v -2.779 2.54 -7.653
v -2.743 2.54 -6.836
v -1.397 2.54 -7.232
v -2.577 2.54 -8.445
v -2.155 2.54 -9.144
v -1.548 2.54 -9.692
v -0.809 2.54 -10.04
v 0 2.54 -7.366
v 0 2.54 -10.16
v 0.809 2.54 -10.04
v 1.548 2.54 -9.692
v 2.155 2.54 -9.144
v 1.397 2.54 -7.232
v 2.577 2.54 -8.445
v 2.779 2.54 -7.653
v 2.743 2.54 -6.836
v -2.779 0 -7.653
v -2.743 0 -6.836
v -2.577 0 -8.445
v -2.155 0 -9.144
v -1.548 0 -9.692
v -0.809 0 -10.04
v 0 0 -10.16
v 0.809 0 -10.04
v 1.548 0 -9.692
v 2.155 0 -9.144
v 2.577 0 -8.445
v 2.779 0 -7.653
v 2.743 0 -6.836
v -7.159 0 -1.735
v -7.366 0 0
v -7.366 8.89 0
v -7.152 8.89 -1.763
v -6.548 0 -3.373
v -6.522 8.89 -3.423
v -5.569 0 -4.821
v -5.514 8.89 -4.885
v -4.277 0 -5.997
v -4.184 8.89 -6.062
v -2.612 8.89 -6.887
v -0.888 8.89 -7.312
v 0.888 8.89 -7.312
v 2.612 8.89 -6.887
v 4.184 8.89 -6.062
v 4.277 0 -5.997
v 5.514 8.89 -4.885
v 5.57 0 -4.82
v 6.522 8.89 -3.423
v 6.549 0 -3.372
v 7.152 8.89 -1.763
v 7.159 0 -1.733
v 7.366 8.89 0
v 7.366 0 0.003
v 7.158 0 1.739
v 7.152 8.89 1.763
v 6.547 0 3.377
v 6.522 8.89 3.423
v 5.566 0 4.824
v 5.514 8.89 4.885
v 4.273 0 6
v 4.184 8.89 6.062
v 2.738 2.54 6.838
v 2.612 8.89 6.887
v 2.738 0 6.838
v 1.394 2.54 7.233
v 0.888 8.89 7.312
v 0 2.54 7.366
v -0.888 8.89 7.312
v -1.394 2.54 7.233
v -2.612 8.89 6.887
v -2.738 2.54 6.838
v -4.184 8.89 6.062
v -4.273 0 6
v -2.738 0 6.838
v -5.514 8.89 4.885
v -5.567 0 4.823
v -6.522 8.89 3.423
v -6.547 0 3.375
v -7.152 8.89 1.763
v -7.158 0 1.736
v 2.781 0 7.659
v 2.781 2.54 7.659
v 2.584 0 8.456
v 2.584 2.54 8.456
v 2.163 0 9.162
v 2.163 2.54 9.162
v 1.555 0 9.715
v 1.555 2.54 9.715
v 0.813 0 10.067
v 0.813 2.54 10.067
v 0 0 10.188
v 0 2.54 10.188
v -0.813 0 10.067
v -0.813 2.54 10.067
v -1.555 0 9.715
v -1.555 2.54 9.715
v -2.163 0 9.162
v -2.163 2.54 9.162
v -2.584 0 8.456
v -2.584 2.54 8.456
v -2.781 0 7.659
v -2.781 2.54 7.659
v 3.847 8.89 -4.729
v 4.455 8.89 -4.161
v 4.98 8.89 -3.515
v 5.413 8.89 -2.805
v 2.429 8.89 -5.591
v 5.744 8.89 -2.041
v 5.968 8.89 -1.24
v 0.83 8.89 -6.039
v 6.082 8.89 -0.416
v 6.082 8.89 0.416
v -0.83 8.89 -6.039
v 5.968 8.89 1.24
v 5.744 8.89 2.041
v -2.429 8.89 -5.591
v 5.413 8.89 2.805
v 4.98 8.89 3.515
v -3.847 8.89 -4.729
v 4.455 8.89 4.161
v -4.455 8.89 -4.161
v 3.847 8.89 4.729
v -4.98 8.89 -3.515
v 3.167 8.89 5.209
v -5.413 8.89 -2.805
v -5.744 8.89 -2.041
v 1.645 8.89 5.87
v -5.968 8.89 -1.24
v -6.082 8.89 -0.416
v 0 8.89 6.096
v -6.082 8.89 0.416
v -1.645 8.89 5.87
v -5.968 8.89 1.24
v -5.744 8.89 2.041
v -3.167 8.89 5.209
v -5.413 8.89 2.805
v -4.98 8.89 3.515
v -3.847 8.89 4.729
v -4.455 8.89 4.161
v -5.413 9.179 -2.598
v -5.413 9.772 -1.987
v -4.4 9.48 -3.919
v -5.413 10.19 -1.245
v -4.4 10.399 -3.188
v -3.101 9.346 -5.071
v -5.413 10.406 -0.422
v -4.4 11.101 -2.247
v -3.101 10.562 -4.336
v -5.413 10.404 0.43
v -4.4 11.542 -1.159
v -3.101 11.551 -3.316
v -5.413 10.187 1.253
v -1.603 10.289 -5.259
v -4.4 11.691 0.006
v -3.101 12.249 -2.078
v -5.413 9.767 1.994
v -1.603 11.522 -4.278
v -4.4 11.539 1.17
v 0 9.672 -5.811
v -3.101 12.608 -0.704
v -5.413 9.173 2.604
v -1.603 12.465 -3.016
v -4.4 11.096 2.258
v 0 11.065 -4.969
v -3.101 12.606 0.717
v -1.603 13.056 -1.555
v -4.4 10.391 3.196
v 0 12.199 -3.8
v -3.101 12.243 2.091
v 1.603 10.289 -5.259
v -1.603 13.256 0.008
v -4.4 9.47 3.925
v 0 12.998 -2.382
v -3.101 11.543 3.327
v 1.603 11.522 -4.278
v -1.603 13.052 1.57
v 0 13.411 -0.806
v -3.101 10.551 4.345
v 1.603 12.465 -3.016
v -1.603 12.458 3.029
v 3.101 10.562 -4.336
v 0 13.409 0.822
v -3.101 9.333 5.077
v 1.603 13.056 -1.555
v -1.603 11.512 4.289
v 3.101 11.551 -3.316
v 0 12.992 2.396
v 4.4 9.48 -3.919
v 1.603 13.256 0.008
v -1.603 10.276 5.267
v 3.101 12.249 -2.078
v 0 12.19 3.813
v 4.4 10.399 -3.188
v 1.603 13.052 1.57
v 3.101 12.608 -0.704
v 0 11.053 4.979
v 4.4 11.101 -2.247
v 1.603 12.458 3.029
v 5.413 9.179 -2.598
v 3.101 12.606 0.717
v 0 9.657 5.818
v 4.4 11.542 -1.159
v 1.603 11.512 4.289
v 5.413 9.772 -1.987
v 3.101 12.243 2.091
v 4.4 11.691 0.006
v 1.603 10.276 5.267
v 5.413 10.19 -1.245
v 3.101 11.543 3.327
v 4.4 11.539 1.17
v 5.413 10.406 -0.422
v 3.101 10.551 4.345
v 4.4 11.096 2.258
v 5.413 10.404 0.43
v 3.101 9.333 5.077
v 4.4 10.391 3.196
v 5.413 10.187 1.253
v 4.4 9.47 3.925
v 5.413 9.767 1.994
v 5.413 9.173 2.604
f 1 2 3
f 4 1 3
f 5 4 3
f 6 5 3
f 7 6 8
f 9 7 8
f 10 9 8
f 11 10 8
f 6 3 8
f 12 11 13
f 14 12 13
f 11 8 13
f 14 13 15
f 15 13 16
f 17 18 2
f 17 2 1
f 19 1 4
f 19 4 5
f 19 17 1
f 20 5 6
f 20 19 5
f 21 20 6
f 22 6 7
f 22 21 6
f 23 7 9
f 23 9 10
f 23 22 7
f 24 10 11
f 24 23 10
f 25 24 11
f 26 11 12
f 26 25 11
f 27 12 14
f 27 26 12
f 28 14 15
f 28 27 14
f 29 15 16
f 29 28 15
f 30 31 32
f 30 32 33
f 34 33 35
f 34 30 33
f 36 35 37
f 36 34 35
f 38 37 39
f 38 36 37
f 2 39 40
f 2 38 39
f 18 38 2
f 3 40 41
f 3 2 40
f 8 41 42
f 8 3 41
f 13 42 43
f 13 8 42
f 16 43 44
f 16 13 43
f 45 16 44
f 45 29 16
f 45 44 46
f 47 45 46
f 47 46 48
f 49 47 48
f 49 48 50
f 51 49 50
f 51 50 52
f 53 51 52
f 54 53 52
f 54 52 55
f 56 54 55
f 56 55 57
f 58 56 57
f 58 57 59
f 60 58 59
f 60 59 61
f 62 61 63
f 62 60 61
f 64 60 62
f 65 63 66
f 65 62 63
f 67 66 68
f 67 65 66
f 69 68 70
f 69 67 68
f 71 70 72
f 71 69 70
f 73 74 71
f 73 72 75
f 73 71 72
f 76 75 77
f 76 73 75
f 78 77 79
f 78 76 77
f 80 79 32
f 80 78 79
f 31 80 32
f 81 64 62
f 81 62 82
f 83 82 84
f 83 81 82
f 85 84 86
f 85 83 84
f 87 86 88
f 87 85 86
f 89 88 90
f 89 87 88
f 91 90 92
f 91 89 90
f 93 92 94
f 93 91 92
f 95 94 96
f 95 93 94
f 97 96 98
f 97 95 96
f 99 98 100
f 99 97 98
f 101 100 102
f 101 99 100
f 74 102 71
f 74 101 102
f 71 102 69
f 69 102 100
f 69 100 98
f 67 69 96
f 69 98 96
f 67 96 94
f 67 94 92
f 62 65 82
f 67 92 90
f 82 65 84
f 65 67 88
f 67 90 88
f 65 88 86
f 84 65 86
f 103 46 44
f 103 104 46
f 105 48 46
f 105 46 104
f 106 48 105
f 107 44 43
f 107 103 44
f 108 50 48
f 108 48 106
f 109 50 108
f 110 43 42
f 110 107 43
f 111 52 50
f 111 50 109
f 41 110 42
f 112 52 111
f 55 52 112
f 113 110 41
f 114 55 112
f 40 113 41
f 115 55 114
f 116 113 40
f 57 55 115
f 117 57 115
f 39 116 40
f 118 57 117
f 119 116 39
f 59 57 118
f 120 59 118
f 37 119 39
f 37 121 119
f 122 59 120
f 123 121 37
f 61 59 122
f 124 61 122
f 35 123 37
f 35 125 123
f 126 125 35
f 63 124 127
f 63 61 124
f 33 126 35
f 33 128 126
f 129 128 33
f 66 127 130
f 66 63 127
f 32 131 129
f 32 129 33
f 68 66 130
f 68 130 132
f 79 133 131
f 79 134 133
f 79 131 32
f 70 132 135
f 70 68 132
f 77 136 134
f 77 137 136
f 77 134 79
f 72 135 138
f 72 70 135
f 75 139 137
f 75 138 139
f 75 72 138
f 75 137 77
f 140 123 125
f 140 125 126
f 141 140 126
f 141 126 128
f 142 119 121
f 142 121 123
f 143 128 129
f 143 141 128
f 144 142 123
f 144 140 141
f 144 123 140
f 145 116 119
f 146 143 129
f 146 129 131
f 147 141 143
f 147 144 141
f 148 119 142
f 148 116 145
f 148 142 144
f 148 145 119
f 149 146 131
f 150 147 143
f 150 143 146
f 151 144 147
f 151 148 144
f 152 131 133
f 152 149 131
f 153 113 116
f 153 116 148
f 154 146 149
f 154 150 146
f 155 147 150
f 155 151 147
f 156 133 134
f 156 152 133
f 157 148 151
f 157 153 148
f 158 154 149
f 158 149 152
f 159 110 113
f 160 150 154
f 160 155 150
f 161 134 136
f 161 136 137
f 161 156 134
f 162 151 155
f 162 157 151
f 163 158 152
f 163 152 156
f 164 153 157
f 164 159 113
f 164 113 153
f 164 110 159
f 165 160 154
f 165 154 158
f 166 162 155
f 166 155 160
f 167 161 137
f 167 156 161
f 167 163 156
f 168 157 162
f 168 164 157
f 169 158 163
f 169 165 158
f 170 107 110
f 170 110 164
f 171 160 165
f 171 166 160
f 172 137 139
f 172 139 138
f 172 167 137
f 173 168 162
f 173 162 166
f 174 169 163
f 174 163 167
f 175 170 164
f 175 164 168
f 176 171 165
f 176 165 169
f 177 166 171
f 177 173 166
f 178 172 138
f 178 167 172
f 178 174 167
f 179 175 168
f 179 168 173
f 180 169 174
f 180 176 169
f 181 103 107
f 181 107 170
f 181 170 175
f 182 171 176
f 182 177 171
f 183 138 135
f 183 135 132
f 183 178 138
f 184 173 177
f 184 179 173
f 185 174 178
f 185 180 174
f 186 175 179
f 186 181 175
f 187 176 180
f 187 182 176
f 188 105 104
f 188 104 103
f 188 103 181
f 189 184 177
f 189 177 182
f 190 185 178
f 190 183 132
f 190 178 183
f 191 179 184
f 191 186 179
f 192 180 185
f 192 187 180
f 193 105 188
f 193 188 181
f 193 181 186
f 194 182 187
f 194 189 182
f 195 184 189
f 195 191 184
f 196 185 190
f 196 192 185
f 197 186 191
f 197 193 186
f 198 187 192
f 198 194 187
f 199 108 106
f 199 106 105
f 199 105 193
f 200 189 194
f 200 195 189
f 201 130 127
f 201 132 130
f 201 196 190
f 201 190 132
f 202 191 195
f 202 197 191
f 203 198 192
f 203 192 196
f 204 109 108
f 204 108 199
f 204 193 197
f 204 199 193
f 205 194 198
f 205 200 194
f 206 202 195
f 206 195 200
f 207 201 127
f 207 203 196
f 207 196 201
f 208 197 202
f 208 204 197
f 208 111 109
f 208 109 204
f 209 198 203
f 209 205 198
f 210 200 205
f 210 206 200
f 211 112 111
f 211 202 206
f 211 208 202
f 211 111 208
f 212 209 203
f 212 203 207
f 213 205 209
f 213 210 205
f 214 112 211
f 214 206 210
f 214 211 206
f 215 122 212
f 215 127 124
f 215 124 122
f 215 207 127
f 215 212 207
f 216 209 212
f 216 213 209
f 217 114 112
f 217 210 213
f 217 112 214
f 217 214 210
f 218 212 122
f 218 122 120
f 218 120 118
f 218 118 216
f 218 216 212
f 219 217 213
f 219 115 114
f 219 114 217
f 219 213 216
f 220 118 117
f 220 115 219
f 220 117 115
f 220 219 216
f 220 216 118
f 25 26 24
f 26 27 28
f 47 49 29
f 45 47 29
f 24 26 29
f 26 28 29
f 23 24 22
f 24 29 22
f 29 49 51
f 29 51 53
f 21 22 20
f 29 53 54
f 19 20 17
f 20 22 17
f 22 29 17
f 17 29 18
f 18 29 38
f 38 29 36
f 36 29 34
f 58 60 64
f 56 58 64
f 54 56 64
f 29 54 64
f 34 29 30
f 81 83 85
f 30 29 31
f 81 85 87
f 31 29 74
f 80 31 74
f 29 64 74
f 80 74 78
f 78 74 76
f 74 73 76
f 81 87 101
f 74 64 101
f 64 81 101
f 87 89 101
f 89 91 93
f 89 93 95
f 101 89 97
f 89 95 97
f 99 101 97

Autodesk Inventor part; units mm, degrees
ref_plane "YZ Plane" through (0, 0, 0) normal (1, 0, 0) x (0, 1, 0)
ref_plane "XZ Plane" through (0, 0, 0) normal (0, 1, 0) x (-1, 0, 0)
sketch "Sketch1" plane through (0, 0, 0) normal (0, 1, 0) x (-1, 0, 0)
  circle A0 centre (0, 0) radius 7.366
  dimension "d0" = 14.732
extrude "Extrusion1" add sketch "Sketch1" along normal blind 8.89
ref_plane "Work Plane1" through (0, 7.112, 0) normal (0, -1, 0) x (1, 0, 0)
sketch "Sketch2" plane through (0, 7.112, 0) normal (0, -1, 0) x (1, 0, 0)
  arc A0 (-6.35, 0) -> (6.35, 0) centre (0, 0) ccw
  circle A1 centre (0, 0) radius 7.366 construction
  line L0 (-7.366, 0) -> (7.366, 0) construction
  line L1 (-6.35, 0) -> (6.35, 0)
  dimension "d4" = 12.7
revolve "Revolution1" add sketch "Sketch2" angle 360 about axis through (-7.366, 7.112, 0) along (1, 0, 0)
sketch "Sketch3" plane through (0, 0, 0) normal (0, -1, 0) x (1, 0, 0)
  line L0 (0, 7.3938) -> (0, -7.366) construction
  circle A0 centre (0, 0) radius 7.366 construction
  circle A1 centre (0, 7.3938) radius 2.794
  circle A2 centre (0, -7.366) radius 2.794
  dimension "d6" = 5.588
  dimension "d7" = 5.588
extrude "Extrusion2" add sketch "Sketch3" against normal blind 2.54
properties part number "caster ball 1 2 inch"
